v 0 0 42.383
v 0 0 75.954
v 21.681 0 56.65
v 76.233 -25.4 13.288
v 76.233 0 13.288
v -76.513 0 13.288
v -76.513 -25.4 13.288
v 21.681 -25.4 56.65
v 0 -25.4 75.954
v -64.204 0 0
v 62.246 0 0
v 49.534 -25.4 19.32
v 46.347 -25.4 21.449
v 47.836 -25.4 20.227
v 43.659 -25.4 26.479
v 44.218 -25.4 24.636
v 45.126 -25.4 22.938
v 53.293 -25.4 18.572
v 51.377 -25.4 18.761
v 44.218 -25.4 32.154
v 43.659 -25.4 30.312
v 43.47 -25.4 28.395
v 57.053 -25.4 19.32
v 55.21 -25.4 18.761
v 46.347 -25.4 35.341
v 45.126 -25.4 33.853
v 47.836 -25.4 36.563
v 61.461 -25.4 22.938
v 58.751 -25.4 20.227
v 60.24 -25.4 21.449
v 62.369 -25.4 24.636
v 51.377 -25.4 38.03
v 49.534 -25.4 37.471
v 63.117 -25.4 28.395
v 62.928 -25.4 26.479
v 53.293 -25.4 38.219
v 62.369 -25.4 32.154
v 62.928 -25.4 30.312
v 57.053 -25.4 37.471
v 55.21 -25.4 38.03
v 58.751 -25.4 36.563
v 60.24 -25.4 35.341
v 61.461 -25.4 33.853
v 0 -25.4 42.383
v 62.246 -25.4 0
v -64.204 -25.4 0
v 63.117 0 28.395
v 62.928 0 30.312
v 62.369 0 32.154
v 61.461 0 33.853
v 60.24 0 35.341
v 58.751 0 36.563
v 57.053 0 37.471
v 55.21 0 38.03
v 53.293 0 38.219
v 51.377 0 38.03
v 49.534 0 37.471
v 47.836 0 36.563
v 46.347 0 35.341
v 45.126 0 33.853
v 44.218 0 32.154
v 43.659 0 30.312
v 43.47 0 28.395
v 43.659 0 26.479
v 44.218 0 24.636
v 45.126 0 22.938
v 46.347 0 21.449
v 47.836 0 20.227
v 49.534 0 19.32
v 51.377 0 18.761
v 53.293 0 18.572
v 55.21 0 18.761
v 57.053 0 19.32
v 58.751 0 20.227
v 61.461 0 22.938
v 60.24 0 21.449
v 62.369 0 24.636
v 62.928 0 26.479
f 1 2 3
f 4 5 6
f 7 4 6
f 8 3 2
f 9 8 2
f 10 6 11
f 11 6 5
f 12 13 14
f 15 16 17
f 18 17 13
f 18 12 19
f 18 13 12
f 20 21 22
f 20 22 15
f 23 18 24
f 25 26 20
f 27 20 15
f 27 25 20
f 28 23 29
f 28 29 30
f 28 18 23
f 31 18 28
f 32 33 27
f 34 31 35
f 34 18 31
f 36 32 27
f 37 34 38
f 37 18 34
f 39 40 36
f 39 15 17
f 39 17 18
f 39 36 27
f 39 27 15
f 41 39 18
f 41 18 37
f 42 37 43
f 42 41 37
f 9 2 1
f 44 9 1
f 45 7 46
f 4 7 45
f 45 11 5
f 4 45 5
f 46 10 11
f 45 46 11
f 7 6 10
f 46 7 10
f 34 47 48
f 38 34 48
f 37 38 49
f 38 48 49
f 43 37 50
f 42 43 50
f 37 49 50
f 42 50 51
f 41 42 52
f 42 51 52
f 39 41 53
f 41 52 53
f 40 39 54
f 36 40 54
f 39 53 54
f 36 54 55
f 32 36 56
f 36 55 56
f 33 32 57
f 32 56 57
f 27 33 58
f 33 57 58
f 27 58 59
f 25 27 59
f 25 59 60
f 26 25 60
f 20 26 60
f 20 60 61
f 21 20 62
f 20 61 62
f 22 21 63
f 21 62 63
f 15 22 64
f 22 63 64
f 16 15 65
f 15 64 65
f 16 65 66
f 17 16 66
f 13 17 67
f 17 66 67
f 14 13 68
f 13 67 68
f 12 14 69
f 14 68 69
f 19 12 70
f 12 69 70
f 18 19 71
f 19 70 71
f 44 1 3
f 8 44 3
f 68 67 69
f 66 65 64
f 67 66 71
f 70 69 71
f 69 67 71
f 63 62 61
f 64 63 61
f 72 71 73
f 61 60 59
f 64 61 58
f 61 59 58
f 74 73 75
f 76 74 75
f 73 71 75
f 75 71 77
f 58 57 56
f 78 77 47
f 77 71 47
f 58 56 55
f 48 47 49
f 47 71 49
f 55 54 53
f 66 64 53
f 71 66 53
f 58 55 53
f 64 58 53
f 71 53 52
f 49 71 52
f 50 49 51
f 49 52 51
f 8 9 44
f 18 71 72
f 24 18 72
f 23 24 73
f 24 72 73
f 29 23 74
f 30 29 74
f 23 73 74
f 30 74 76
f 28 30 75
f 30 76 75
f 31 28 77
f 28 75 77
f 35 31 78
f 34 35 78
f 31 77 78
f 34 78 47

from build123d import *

# Parameters (mm, degrees)
F1_DEPTH = 25.4


with BuildPart() as f1:
    # F0 (on Front) → F1 (new body)
    with BuildSketch(Plane.XZ):
        Polygon((0, 75.953551), (0, 42.382922), (21.681031, 56.650437), align=None)
        with BuildLine():
            ThreePointArc((63.116733, 28.395159), (46.347209, 35.341324), (53.293373, 18.571799))
            ThreePointArc((53.293373, 18.571799), (60.239538, 21.448995), (63.116733, 28.395159))
        make_face()
        Polygon((-64.203829, 0), (0, 0), (62.245544, 0), (76.233305, 13.288374), (53.293373, 13.288374), (0, 13.288374), (-76.513059, 13.288374), align=None)
    extrude(amount=F1_DEPTH)


solid = f1.part
